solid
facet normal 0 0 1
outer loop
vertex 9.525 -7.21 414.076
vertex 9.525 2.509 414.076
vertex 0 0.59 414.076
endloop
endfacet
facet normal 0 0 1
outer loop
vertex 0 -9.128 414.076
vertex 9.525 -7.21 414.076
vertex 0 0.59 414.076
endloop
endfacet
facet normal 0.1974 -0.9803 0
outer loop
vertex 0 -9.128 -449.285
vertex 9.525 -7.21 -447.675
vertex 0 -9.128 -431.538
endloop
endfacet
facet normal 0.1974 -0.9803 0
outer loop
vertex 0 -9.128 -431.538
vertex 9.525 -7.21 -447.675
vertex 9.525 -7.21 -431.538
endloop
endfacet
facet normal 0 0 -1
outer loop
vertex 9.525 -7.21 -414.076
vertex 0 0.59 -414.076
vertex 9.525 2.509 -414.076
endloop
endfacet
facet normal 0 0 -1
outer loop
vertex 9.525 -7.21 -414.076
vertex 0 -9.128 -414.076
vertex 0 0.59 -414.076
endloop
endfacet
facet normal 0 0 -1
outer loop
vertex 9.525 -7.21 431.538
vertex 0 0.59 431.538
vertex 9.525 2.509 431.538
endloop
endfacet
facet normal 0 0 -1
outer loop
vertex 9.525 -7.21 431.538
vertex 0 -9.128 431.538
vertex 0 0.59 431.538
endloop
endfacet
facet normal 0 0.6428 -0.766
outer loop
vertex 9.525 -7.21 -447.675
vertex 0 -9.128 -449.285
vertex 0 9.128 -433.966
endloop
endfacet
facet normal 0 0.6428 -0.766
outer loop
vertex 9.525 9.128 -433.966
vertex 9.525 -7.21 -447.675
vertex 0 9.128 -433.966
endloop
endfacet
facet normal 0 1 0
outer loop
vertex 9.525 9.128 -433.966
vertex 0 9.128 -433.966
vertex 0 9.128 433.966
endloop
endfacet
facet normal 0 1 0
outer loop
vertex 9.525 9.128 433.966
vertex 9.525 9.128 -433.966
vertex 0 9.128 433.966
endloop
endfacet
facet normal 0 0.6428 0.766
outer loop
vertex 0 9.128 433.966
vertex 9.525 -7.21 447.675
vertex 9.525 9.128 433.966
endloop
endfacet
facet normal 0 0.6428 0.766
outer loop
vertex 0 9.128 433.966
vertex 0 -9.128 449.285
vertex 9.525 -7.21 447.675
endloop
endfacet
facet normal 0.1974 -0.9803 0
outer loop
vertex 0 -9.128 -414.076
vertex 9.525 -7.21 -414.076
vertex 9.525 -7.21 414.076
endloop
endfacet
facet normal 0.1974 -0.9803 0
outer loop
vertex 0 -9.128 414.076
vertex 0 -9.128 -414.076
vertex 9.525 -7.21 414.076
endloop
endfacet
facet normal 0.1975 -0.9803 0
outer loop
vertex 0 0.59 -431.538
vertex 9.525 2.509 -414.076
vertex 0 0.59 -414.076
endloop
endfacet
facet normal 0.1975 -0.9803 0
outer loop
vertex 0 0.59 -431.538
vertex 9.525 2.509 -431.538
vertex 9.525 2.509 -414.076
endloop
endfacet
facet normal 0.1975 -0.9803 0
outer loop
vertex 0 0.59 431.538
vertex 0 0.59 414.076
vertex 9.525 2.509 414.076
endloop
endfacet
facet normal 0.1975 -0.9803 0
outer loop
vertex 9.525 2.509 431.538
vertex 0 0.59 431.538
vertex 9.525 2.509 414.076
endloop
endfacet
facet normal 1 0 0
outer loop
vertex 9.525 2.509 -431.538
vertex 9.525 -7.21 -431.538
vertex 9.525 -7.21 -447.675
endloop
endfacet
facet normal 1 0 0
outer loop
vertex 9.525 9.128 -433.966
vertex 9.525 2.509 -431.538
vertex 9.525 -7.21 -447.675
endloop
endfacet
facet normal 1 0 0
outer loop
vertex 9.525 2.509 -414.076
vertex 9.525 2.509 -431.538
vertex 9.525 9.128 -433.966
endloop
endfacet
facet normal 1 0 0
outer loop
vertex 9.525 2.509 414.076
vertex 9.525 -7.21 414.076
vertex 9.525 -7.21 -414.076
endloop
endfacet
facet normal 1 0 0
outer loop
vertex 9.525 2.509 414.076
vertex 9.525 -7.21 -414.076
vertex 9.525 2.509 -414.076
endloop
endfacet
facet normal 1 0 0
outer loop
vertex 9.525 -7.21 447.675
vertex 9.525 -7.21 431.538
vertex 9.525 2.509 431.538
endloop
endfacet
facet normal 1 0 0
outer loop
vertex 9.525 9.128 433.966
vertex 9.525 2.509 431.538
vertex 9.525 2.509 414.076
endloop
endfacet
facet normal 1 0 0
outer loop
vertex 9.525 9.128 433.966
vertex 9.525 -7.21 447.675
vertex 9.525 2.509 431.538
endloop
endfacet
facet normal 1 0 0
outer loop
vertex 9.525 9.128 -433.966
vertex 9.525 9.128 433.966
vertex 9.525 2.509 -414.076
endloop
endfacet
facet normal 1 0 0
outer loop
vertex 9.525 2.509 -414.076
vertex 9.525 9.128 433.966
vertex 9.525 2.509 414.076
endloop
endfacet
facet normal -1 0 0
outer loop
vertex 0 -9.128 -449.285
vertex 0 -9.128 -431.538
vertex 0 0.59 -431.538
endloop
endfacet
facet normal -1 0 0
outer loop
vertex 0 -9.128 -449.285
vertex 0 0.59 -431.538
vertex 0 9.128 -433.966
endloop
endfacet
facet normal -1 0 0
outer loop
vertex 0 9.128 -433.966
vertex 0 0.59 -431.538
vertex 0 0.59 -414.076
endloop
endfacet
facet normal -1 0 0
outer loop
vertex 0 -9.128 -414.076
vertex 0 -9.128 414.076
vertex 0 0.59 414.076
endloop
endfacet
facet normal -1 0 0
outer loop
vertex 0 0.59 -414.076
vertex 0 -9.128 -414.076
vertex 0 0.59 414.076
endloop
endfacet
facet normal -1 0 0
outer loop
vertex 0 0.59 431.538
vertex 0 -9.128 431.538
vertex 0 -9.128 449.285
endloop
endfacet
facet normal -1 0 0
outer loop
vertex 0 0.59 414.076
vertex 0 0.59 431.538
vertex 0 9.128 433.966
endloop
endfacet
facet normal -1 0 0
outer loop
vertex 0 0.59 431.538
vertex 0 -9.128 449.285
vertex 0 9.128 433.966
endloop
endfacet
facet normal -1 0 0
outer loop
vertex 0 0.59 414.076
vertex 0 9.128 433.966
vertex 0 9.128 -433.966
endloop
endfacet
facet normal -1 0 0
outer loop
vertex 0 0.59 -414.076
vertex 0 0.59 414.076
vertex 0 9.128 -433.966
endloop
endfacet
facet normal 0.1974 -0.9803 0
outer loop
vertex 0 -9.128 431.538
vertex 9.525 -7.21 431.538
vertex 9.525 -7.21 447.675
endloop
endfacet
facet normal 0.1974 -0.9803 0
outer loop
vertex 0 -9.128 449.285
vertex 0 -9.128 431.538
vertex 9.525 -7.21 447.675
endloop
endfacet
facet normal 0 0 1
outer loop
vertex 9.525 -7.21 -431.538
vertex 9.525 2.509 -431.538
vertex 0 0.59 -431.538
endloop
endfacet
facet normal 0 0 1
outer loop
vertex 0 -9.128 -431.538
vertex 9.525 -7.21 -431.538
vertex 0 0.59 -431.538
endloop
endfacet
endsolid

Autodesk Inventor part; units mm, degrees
ref_plane "YZ Plane" through (0, 0, 0) normal (1, 0, 0) x (0, 1, 0)
ref_plane "XZ Plane" through (0, 0, 0) normal (0, 1, 0) x (-1, 0, 0)
ref_plane "XY Plane" through (0, 0, 0) normal (0, 0, 1) x (1, 0, 0)
sketch "Sketch1" plane through (0, 0, 0) normal (1, 0, 0) x (0, 1, 0)
  line L0 (-9.1281, -449.2848) -> (9.1281, -449.2848) construction
  line L1 (9.1281, -449.2848) -> (9.1281, 449.2848)
  line L2 (9.1281, 449.2848) -> (-9.1281, 449.2848) construction
  line L3 (-9.1281, 449.2848) -> (-9.1281, -449.2848)
  line L4 (-9.1281, -449.2848) -> (9.1281, 449.2848) construction
  line L5 (9.1281, -449.2848) -> (-9.1281, 449.2848) construction
  line L6 (-9.1281, 449.2848) -> (9.1281, 433.966)
  line L7 (-9.1281, -449.2848) -> (9.1281, -433.966)
  point P0 (0, 0)
  dimension "d0" = 898.5697
  dimension "d1" = 18.2563
  dimension "d16" = 40
  dimension "d17" = 40
extrude "Extrusion1" add sketch "Sketch1" along normal blind 9.525
chamfer "Chamfer1" distance 9.525 angle 11.388 1 edges at (9.525, -9.1281, 0) measured on face at (3.175, -9.1281, 149.7616)
sketch "Sketch4" plane through (0, -9.1281, -449.2848) normal (0.1975, -0.9803, 0) x (0.9803, 0.1975, 0)
  line L0 (0, 880.8231) -> (12.9422, 880.8231)
  line L1 (12.9422, 880.8231) -> (12.9422, 863.3606)
  line L2 (12.9422, 863.3606) -> (0, 863.3606)
  line L3 (0, 863.3606) -> (0, 880.8231)
  line L4 (12.9422, 15.3188) -> (12.9422, 883.2508) projected
  line L5 (0, 898.5697) -> (0, 0) projected
  point P0 (1.8024, 449.2848)
  dimension "d21" = 17.7466
  dimension "d22" = 17.4625
extrude "Extrusion4" cut sketch "Sketch4" against normal blind 9.525
mirror "Mirror2" about plane through (0, 0, 0) normal (0, 0, 1) of "Extrusion4"
properties part number "BASE_SIDEK_TREBUCHET" material "Wood (Birch)"
